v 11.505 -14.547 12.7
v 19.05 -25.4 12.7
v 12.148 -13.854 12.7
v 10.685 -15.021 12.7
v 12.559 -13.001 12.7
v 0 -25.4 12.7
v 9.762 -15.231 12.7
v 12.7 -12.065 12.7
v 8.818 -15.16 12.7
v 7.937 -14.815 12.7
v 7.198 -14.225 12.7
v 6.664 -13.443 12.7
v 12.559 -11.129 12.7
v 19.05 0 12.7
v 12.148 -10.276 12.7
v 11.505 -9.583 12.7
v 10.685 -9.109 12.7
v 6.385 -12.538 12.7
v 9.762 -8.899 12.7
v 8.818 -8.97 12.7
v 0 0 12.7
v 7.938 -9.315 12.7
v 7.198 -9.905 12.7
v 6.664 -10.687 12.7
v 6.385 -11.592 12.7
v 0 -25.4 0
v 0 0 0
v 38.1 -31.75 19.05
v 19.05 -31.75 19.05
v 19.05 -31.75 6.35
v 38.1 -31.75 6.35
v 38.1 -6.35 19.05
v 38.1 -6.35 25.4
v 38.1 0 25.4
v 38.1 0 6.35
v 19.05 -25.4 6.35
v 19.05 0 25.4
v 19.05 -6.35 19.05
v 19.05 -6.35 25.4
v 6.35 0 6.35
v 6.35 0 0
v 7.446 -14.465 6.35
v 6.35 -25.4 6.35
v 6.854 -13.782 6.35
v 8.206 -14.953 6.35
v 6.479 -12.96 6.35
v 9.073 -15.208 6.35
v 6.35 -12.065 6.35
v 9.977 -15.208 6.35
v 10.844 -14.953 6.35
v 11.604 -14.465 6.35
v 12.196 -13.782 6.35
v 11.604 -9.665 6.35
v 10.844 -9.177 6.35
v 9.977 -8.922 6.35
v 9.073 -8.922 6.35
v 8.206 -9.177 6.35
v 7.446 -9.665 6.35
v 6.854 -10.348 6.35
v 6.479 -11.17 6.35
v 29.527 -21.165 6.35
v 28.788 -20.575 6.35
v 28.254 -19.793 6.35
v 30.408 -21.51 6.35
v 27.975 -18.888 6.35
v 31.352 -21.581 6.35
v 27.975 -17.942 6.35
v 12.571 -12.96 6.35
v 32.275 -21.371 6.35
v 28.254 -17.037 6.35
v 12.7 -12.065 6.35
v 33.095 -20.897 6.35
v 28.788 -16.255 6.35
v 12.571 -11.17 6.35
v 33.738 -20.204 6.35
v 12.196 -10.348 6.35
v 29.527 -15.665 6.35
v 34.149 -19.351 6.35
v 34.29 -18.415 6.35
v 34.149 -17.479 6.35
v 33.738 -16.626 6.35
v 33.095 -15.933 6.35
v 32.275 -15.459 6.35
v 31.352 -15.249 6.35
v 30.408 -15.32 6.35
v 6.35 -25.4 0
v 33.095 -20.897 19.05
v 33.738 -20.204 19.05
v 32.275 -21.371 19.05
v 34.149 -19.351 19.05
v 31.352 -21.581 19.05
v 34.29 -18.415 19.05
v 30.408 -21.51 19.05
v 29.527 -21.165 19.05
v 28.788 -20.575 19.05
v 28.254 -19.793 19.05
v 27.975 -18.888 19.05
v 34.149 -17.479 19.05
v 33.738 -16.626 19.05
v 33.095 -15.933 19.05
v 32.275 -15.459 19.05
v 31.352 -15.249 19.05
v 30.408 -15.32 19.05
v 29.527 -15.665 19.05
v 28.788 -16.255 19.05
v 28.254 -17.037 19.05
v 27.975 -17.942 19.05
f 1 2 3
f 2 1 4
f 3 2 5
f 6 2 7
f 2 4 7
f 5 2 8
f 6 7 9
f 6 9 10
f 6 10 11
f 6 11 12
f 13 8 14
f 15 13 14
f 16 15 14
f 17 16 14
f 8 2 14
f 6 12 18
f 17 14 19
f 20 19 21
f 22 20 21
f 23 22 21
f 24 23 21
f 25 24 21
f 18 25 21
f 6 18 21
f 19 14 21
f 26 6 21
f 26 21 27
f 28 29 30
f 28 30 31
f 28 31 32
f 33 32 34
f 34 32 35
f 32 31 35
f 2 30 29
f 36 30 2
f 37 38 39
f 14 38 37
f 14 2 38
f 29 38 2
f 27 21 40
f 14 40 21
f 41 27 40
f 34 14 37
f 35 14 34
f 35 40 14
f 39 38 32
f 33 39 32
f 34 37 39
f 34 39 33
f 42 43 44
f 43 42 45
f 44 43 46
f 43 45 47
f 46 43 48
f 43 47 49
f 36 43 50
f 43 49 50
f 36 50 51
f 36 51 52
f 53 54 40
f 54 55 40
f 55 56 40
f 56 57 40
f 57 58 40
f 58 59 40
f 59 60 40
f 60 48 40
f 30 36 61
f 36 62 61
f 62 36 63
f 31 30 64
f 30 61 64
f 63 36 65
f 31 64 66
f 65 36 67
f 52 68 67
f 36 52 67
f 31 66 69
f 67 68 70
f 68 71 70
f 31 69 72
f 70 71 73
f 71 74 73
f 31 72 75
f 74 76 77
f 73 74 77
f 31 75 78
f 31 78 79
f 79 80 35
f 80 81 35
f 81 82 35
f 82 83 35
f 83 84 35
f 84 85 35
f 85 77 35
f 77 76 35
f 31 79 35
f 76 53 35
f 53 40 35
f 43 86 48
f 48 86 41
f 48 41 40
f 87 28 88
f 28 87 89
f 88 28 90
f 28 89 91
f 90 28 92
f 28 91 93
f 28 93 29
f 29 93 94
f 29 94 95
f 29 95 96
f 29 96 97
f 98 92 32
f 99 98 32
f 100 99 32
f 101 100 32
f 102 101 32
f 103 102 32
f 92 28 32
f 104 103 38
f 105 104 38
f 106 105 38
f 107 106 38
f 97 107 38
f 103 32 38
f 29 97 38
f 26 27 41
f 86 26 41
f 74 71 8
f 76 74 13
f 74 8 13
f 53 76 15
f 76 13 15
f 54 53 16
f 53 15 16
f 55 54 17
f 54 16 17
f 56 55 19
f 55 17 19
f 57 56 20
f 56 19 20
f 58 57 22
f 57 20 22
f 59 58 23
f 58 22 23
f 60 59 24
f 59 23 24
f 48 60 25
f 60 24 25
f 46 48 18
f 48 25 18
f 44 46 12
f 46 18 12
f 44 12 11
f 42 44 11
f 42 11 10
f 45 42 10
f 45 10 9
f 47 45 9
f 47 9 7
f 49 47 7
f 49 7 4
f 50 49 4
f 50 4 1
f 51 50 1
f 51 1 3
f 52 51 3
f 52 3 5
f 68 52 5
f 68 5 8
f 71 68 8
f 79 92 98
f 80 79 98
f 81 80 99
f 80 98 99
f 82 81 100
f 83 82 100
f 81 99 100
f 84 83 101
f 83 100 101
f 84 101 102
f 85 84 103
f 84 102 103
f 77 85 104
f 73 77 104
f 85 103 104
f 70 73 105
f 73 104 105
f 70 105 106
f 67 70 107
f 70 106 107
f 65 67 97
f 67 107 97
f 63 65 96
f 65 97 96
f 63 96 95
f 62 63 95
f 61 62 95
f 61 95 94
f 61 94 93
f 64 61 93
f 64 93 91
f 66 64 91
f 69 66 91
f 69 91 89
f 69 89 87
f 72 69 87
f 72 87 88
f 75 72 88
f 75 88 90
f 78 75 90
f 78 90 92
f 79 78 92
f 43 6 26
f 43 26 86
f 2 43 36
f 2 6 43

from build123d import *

# Parameters (mm, degrees)
F1_DEPTH = 31.75
F3_DEPTH = 6.35
F4_W     = 19.05
F4_H     = 6.35
F5_DEPTH = 6.35
F4_R     = 3.175
F6_DEPTH = 19.051


with BuildPart() as f1:
    # F0 (on Front) → F1 (new body)
    with BuildSketch(Plane.XZ):
        Polygon((0, 12.7), (0, 0), (6.35, 0), (6.35, 6.35), (38.1, 6.35), (38.1, 19.05), (19.05, 19.05), (19.05, 12.7), align=None)
    extrude(amount=F1_DEPTH)

    # F2 (on face) → F3 (cut)
    with BuildSketch(Plane.XZ.offset(31.75)):
        Polygon((19.05, 6.35), (19.05, 12.7), (0, 12.7), (0, 0), (6.35, 0), (6.35, 6.35), align=None)
    extrude(amount=-F3_DEPTH, mode=Mode.SUBTRACT)

    # F4 (on face) → F5 (join)
    with BuildSketch(Plane.XY.offset(19.05)):
        with Locations((28.575, -3.175)):
            Rectangle(F4_W, F4_H)
    extrude(amount=F5_DEPTH)

    # F4 (on face) → F6 (cut, through all)
    with BuildSketch(Plane.XY.offset(19.05)):
        with Locations((31.115, -18.415)):
            Circle(F4_R)
        with Locations((9.525, -12.065)):
            Circle(F4_R)
    extrude(amount=-F6_DEPTH, mode=Mode.SUBTRACT)


solid = f1.part
